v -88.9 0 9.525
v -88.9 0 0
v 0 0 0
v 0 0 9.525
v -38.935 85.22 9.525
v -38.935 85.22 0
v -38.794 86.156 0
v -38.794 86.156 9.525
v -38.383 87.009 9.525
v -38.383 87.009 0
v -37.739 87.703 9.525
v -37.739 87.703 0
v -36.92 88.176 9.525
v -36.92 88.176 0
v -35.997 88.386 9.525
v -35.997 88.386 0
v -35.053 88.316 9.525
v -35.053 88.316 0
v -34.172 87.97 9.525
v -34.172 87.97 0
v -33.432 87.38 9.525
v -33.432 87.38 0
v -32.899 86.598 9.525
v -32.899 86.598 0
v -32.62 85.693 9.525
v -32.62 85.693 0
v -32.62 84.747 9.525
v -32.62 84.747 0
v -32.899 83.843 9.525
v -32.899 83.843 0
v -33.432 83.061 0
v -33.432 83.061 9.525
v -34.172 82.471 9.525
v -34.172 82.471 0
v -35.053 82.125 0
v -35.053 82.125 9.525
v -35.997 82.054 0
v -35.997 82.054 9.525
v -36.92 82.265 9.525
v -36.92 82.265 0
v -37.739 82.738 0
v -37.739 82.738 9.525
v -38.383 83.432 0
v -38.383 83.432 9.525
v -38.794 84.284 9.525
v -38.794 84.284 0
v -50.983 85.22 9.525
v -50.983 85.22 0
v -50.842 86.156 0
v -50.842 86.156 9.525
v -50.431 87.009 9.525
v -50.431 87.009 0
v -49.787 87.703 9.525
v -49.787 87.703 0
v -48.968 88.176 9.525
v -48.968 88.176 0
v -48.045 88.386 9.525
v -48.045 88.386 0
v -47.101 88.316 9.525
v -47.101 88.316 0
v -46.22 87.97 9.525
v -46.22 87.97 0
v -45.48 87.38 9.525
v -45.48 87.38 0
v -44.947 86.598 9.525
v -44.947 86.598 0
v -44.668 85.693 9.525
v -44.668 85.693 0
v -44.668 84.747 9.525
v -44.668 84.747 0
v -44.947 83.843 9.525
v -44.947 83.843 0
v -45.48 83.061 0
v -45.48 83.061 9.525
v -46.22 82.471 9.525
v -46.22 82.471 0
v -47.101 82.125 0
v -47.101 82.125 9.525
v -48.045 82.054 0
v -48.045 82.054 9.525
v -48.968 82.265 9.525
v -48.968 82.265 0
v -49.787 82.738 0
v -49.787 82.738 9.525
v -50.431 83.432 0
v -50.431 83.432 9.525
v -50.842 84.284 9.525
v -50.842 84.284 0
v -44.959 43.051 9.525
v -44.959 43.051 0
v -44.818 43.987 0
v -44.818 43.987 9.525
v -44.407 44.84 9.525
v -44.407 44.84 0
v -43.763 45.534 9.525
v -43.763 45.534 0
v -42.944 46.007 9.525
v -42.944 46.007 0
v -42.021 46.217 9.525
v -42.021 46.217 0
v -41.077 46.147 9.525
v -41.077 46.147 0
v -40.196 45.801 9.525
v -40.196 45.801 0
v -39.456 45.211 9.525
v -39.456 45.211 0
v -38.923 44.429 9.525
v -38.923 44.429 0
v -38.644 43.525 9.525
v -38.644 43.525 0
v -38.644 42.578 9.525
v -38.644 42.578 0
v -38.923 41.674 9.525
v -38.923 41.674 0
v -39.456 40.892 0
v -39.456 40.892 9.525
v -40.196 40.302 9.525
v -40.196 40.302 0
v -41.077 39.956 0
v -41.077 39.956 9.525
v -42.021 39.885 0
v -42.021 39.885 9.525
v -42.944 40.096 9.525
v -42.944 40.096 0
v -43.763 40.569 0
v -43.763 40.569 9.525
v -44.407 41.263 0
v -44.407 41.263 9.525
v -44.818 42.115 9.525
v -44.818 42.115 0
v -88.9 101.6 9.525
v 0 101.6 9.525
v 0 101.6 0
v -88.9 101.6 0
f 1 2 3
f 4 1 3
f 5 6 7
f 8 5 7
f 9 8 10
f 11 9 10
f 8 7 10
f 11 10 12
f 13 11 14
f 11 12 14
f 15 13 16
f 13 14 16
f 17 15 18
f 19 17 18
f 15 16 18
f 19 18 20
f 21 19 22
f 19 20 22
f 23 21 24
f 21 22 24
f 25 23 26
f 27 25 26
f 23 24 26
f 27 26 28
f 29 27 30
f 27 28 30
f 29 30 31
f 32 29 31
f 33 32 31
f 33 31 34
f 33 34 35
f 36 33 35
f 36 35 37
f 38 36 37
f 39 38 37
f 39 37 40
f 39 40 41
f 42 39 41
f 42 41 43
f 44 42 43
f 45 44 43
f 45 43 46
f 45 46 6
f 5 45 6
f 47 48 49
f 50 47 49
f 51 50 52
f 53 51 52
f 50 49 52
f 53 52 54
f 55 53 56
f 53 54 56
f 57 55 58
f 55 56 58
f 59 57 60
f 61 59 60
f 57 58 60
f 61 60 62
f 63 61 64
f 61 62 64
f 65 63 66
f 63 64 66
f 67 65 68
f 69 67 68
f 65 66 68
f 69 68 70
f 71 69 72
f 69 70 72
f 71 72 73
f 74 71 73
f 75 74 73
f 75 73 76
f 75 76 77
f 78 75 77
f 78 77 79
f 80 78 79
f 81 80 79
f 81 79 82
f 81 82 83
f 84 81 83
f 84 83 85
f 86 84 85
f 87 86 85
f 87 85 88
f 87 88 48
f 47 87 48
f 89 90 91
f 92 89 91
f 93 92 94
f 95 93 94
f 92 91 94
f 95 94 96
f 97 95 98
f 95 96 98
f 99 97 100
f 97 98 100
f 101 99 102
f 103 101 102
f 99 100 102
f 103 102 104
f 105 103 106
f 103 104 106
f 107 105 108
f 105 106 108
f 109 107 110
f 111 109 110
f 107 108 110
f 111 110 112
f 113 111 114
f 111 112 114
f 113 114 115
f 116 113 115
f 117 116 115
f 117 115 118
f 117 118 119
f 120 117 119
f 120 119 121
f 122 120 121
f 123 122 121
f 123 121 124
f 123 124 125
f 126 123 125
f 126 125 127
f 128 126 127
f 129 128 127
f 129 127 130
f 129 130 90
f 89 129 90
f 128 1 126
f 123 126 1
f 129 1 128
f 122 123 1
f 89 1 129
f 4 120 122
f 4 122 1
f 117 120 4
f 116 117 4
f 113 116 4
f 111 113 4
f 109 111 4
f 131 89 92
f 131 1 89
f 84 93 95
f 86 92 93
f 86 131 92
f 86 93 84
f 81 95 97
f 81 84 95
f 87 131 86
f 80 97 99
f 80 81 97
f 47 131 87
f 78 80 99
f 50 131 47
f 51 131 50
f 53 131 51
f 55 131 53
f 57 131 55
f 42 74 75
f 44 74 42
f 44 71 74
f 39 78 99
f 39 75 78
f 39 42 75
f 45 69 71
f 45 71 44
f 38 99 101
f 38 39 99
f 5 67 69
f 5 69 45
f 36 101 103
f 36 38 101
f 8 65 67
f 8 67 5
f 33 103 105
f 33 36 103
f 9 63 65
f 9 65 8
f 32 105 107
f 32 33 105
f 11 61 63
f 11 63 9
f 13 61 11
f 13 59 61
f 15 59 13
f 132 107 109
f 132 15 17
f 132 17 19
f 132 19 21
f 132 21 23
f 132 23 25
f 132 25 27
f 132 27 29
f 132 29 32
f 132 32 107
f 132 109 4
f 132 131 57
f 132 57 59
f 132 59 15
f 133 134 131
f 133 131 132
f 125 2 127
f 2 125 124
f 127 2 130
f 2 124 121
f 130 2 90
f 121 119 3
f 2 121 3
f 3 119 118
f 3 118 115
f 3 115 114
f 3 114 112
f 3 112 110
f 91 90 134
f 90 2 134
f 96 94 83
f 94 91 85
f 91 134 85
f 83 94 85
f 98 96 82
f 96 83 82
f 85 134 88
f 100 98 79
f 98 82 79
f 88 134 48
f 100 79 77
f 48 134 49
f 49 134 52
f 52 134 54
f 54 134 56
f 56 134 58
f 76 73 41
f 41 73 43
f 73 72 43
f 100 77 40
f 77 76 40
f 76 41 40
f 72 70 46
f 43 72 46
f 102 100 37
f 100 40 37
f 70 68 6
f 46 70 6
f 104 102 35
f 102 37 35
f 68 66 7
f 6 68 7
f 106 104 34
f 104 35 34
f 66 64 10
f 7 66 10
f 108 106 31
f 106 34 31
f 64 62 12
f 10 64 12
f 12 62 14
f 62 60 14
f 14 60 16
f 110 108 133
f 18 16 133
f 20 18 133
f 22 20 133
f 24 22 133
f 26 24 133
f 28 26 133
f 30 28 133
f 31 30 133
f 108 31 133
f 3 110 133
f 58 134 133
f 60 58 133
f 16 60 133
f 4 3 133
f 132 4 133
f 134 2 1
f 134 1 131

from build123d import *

# Parameters (mm, degrees)
SKETCH1_W                   = 88.9
SKETCH1_H                   = 101.6
BOSS_EXTRUDE1_DEPTH         = 9.525
F_1_4_0_25_DIAMETER_HOLE1_D = 6.35
F_1_4_0_25_DIAMETER_HOLE2_D = 6.35


with BuildPart() as part:
    # Sketch1 → Boss-Extrude1 (new body)
    with BuildSketch(Plane.XY):
        with Locations((-44.45, 50.8)):
            Rectangle(SKETCH1_W, SKETCH1_H)
    extrude(amount=BOSS_EXTRUDE1_DEPTH)

    # 1/4 (0.25) Diameter Hole1 (through all)
    with Locations(Plane.XY.offset(9.525)):
        with Locations((-35.759581135, 85.220282149), (-41.783720078, 43.051309551)):
            Hole(F_1_4_0_25_DIAMETER_HOLE1_D / 2)

    # 1/4 (0.25) Diameter Hole2 (through all)
    with Locations(Plane.XY.offset(9.525)):
        with Locations((-47.80785902, 85.220282149)):
            Hole(F_1_4_0_25_DIAMETER_HOLE2_D / 2)


solid = part.part
